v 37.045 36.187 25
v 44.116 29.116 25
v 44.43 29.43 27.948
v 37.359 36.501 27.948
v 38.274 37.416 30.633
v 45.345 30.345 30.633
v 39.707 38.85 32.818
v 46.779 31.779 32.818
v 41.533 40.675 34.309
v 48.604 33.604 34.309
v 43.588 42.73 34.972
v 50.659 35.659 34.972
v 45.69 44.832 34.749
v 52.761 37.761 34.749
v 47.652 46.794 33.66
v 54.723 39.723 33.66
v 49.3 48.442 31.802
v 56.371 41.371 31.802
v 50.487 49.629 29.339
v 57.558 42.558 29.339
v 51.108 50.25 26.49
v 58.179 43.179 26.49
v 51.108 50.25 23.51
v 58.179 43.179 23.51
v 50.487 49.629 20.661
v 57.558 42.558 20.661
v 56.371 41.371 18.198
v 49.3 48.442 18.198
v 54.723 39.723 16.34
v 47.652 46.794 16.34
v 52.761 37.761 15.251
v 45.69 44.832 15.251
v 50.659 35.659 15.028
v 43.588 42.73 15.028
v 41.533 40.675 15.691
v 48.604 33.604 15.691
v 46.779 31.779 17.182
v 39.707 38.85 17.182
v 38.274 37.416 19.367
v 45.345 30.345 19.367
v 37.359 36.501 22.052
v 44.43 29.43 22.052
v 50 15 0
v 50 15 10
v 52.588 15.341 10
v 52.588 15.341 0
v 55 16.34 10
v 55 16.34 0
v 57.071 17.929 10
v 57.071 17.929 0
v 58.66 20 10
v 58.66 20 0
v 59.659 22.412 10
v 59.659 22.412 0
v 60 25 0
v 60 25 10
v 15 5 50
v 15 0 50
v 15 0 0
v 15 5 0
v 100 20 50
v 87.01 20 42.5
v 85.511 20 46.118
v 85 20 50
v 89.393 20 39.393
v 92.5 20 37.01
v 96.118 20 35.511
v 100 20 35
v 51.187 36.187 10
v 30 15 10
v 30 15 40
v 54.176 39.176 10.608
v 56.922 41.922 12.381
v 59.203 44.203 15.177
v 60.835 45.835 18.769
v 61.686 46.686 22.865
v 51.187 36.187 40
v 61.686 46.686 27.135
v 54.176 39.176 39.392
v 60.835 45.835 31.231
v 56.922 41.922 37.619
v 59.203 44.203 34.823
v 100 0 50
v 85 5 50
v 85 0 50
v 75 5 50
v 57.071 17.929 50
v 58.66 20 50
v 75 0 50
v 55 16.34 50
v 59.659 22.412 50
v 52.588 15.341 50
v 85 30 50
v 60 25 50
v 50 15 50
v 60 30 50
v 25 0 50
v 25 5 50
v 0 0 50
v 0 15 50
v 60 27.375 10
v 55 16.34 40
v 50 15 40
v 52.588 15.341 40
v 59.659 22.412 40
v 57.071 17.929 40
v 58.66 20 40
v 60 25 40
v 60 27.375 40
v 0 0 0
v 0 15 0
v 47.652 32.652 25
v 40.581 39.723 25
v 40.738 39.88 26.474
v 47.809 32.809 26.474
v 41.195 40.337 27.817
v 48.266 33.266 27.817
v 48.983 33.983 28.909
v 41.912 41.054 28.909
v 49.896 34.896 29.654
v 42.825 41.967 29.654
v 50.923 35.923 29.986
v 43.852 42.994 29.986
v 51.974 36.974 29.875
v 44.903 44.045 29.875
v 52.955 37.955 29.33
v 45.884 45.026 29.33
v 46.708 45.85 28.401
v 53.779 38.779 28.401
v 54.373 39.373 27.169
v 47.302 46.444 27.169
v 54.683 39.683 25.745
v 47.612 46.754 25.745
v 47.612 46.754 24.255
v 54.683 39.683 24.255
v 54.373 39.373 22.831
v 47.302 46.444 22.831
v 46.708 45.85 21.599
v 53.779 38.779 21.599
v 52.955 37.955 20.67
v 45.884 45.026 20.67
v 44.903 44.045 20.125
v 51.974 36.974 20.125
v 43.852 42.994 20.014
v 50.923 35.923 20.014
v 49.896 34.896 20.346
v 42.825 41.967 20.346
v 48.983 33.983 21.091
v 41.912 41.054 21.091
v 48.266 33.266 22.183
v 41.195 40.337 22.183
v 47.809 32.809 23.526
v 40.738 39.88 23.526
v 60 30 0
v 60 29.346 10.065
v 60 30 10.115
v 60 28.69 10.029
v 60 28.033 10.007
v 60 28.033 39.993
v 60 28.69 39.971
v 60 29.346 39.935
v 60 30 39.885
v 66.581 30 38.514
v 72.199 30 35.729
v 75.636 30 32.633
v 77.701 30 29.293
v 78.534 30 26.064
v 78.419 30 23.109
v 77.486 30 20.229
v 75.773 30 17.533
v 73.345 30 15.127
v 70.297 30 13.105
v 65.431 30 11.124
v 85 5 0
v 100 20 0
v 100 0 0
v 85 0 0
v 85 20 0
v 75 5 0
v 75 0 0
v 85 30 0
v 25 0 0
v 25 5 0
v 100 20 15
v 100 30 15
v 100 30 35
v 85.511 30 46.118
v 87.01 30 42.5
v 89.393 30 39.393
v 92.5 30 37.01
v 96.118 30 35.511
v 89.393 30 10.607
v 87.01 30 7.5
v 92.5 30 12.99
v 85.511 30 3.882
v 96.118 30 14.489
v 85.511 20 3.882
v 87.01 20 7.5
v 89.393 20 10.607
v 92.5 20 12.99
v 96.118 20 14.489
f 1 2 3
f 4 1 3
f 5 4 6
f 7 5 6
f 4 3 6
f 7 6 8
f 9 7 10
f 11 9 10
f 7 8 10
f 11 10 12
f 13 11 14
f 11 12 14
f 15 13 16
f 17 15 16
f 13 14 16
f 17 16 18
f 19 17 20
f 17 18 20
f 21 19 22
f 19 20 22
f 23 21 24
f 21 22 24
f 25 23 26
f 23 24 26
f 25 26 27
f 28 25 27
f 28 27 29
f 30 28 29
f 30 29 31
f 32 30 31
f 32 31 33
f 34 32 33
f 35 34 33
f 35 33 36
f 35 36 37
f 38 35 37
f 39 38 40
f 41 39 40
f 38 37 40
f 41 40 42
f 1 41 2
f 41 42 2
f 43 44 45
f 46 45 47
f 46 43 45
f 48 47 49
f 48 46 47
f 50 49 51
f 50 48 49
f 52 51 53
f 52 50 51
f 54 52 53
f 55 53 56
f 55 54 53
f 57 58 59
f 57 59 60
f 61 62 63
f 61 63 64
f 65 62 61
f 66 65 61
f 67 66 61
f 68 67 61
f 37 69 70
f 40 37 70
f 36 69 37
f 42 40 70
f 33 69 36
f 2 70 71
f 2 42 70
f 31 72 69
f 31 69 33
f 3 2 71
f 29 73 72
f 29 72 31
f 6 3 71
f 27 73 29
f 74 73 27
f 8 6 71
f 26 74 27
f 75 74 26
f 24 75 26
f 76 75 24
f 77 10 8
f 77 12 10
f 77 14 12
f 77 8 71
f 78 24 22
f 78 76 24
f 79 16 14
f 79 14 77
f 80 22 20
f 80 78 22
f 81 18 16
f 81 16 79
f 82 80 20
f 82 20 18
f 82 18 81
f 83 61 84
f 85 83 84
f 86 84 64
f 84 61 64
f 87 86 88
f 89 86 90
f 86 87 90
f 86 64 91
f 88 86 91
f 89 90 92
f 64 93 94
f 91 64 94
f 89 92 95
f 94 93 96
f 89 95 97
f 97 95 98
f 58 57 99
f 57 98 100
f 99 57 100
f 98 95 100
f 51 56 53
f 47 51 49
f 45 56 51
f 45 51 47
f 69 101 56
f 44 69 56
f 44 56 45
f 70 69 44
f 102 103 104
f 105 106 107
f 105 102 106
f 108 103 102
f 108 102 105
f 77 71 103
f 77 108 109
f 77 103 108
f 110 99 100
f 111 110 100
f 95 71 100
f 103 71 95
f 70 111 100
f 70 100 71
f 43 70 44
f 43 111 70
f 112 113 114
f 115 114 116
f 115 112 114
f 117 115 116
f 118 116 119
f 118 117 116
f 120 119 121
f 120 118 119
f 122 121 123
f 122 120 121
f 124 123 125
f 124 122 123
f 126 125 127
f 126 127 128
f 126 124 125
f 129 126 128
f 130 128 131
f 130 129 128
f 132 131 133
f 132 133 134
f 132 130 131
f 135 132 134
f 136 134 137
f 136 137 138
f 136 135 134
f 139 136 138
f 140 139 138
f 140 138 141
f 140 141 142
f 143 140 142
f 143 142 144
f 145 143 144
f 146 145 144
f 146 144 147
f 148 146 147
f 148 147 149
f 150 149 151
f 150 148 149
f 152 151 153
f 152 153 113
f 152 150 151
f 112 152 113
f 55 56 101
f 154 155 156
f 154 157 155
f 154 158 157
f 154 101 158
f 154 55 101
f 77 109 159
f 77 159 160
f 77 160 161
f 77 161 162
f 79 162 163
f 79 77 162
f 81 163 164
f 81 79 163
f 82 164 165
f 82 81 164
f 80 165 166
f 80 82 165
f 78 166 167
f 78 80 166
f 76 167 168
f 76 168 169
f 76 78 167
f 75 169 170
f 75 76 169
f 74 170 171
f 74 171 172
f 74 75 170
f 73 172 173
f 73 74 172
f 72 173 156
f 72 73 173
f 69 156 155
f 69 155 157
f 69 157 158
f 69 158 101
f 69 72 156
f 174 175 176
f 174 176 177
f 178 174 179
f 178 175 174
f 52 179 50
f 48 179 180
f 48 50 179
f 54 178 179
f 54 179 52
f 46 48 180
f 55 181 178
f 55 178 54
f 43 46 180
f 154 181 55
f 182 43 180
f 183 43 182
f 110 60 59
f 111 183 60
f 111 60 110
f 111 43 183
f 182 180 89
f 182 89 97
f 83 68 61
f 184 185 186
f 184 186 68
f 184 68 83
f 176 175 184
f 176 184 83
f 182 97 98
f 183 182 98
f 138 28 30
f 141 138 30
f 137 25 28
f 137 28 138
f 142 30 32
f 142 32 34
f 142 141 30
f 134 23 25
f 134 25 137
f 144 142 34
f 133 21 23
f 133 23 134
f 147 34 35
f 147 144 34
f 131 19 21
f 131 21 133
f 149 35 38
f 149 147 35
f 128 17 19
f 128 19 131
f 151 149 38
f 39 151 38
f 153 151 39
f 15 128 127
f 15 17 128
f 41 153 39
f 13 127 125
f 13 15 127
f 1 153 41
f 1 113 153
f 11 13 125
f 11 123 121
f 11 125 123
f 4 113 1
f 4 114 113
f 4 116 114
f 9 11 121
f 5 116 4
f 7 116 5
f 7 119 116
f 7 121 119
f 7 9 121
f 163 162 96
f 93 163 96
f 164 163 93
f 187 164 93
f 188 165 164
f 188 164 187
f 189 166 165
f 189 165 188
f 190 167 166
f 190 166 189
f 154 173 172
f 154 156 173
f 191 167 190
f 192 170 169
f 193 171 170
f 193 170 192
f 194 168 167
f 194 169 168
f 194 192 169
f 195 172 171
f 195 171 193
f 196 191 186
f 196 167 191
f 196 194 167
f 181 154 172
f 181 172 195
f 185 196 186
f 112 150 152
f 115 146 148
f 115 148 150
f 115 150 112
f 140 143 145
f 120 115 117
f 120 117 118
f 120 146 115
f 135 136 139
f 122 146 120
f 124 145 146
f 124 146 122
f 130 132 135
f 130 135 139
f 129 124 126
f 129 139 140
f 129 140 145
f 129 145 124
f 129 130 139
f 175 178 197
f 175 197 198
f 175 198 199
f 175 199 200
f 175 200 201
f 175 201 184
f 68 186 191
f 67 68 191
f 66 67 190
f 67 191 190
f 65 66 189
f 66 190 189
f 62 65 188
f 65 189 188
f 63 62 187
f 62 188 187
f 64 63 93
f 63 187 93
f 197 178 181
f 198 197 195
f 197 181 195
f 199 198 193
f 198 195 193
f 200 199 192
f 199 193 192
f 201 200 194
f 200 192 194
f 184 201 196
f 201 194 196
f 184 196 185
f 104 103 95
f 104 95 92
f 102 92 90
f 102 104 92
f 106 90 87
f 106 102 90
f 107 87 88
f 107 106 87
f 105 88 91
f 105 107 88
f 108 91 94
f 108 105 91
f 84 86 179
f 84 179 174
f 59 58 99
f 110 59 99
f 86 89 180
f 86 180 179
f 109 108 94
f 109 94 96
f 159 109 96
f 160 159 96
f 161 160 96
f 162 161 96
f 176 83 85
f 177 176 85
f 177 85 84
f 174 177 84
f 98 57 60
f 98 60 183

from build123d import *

# Parameters (mm, degrees)
BOSS_EXTRUDE1_DEPTH = 50
BOSS_EXTRUDE2_REACH = 113.636
SKETCH2_W           = 30
SKETCH2_H           = 14.178790152
SKETCH3_R           = 10
SKETCH3_R_2         = 5
BOSS_EXTRUDE3_DEPTH = 10
SKETCH4_R           = 15
CUT_EXTRUDE1_DEPTH  = 10
SKETCH5_W           = 10
SKETCH5_H           = 5
CUT_EXTRUDE2_DEPTH  = 123.609341231


with BuildPart() as part:
    # Sketch1 → Boss-Extrude1 (new body)
    with BuildSketch(Plane.XY):
        with BuildLine():
            Line((0, 0), (0, 15))
            Line((0, 15), (50, 15))
            ThreePointArc((50, 15), (57.071067812, 17.928932188), (60, 25))
            Line((60, 25), (60, 30))
            Line((60, 30), (100, 30))
            Line((100, 30), (100, 0))
            Line((100, 0), (0, 0))
        make_face()
    extrude(amount=BOSS_EXTRUDE1_DEPTH)

    # Sketch2 → Boss-Extrude2 (add, up to next)
    with BuildSketch(Plane(origin=(7.5, -7.5, 0), x_dir=(0, 0, 1), z_dir=(-0.7071067811865488, 0.7071067811865464, 0)), mode=Mode.PRIVATE) as boss_extrude2_sk1:
        with Locations((25, 38.872545701)):
            Rectangle(SKETCH2_W, SKETCH2_H)
    boss_extrude2_tool1 = extrude(boss_extrude2_sk1.sketch, amount=-BOSS_EXTRUDE2_REACH, mode=Mode.PRIVATE) - part.part
    # Sketch2 → Boss-Extrude2 (add, up to next)
    with BuildSketch(Plane(origin=(7.5, -7.5, 0), x_dir=(0, 0, 1), z_dir=(-0.7071067811865488, 0.7071067811865464, 0)), mode=Mode.PRIVATE) as boss_extrude2_sk2:
        with BuildLine():
            Line((10, 61.783150625), (10, 45.961940777))
            Line((10, 45.961940777), (40, 45.961940777))
            Line((40, 45.961940777), (40, 61.783150625))
            ThreePointArc((40, 61.783150625), (25, 76.783150625), (10, 61.783150625))
        make_face()
    boss_extrude2_tool2 = extrude(boss_extrude2_sk2.sketch, amount=-BOSS_EXTRUDE2_REACH, mode=Mode.PRIVATE) - part.part
    add(boss_extrude2_tool1.solids().sort_by_distance((34.987041, 19.987041, 25))[0])
    add(boss_extrude2_tool2.solids().sort_by_distance((49.902416, 34.902416, 25))[0])

    # Sketch3 → Boss-Extrude3 (add)
    with BuildSketch(Plane(origin=(7.5, -7.5, 0), x_dir=(0, 0, 1), z_dir=(-0.7071067811865486, 0.7071067811865465, 0))):
        with Locations(Location((25, 61.783150625, 0), (0, 0, 270))):
            Circle(SKETCH3_R)
        with Locations(Location((25, 61.783150625, 0), (0, 0, 270))):
            Circle(SKETCH3_R_2, mode=Mode.SUBTRACT)
    extrude(amount=BOSS_EXTRUDE3_DEPTH)

    # Sketch4 → Cut-Extrude1 (cut)
    with BuildSketch(Plane(origin=(0, 30, 0), x_dir=(1, 0, 0), z_dir=(0, 1, 0))):
        with Locations((100, 0)):
            Circle(SKETCH4_R)
        with Locations((100, -50)):
            Circle(SKETCH4_R)
    extrude(amount=-CUT_EXTRUDE1_DEPTH, mode=Mode.SUBTRACT)

    # Sketch5 → Cut-Extrude2 (cut, through all)
    with BuildSketch(Plane.XY.offset(50)):
        with Locations((20, 2.5)):
            Rectangle(SKETCH5_W, SKETCH5_H)
        with Locations((80, 2.5)):
            Rectangle(SKETCH5_W, SKETCH5_H)
    extrude(amount=-CUT_EXTRUDE2_DEPTH, mode=Mode.SUBTRACT)


solid = part.part
